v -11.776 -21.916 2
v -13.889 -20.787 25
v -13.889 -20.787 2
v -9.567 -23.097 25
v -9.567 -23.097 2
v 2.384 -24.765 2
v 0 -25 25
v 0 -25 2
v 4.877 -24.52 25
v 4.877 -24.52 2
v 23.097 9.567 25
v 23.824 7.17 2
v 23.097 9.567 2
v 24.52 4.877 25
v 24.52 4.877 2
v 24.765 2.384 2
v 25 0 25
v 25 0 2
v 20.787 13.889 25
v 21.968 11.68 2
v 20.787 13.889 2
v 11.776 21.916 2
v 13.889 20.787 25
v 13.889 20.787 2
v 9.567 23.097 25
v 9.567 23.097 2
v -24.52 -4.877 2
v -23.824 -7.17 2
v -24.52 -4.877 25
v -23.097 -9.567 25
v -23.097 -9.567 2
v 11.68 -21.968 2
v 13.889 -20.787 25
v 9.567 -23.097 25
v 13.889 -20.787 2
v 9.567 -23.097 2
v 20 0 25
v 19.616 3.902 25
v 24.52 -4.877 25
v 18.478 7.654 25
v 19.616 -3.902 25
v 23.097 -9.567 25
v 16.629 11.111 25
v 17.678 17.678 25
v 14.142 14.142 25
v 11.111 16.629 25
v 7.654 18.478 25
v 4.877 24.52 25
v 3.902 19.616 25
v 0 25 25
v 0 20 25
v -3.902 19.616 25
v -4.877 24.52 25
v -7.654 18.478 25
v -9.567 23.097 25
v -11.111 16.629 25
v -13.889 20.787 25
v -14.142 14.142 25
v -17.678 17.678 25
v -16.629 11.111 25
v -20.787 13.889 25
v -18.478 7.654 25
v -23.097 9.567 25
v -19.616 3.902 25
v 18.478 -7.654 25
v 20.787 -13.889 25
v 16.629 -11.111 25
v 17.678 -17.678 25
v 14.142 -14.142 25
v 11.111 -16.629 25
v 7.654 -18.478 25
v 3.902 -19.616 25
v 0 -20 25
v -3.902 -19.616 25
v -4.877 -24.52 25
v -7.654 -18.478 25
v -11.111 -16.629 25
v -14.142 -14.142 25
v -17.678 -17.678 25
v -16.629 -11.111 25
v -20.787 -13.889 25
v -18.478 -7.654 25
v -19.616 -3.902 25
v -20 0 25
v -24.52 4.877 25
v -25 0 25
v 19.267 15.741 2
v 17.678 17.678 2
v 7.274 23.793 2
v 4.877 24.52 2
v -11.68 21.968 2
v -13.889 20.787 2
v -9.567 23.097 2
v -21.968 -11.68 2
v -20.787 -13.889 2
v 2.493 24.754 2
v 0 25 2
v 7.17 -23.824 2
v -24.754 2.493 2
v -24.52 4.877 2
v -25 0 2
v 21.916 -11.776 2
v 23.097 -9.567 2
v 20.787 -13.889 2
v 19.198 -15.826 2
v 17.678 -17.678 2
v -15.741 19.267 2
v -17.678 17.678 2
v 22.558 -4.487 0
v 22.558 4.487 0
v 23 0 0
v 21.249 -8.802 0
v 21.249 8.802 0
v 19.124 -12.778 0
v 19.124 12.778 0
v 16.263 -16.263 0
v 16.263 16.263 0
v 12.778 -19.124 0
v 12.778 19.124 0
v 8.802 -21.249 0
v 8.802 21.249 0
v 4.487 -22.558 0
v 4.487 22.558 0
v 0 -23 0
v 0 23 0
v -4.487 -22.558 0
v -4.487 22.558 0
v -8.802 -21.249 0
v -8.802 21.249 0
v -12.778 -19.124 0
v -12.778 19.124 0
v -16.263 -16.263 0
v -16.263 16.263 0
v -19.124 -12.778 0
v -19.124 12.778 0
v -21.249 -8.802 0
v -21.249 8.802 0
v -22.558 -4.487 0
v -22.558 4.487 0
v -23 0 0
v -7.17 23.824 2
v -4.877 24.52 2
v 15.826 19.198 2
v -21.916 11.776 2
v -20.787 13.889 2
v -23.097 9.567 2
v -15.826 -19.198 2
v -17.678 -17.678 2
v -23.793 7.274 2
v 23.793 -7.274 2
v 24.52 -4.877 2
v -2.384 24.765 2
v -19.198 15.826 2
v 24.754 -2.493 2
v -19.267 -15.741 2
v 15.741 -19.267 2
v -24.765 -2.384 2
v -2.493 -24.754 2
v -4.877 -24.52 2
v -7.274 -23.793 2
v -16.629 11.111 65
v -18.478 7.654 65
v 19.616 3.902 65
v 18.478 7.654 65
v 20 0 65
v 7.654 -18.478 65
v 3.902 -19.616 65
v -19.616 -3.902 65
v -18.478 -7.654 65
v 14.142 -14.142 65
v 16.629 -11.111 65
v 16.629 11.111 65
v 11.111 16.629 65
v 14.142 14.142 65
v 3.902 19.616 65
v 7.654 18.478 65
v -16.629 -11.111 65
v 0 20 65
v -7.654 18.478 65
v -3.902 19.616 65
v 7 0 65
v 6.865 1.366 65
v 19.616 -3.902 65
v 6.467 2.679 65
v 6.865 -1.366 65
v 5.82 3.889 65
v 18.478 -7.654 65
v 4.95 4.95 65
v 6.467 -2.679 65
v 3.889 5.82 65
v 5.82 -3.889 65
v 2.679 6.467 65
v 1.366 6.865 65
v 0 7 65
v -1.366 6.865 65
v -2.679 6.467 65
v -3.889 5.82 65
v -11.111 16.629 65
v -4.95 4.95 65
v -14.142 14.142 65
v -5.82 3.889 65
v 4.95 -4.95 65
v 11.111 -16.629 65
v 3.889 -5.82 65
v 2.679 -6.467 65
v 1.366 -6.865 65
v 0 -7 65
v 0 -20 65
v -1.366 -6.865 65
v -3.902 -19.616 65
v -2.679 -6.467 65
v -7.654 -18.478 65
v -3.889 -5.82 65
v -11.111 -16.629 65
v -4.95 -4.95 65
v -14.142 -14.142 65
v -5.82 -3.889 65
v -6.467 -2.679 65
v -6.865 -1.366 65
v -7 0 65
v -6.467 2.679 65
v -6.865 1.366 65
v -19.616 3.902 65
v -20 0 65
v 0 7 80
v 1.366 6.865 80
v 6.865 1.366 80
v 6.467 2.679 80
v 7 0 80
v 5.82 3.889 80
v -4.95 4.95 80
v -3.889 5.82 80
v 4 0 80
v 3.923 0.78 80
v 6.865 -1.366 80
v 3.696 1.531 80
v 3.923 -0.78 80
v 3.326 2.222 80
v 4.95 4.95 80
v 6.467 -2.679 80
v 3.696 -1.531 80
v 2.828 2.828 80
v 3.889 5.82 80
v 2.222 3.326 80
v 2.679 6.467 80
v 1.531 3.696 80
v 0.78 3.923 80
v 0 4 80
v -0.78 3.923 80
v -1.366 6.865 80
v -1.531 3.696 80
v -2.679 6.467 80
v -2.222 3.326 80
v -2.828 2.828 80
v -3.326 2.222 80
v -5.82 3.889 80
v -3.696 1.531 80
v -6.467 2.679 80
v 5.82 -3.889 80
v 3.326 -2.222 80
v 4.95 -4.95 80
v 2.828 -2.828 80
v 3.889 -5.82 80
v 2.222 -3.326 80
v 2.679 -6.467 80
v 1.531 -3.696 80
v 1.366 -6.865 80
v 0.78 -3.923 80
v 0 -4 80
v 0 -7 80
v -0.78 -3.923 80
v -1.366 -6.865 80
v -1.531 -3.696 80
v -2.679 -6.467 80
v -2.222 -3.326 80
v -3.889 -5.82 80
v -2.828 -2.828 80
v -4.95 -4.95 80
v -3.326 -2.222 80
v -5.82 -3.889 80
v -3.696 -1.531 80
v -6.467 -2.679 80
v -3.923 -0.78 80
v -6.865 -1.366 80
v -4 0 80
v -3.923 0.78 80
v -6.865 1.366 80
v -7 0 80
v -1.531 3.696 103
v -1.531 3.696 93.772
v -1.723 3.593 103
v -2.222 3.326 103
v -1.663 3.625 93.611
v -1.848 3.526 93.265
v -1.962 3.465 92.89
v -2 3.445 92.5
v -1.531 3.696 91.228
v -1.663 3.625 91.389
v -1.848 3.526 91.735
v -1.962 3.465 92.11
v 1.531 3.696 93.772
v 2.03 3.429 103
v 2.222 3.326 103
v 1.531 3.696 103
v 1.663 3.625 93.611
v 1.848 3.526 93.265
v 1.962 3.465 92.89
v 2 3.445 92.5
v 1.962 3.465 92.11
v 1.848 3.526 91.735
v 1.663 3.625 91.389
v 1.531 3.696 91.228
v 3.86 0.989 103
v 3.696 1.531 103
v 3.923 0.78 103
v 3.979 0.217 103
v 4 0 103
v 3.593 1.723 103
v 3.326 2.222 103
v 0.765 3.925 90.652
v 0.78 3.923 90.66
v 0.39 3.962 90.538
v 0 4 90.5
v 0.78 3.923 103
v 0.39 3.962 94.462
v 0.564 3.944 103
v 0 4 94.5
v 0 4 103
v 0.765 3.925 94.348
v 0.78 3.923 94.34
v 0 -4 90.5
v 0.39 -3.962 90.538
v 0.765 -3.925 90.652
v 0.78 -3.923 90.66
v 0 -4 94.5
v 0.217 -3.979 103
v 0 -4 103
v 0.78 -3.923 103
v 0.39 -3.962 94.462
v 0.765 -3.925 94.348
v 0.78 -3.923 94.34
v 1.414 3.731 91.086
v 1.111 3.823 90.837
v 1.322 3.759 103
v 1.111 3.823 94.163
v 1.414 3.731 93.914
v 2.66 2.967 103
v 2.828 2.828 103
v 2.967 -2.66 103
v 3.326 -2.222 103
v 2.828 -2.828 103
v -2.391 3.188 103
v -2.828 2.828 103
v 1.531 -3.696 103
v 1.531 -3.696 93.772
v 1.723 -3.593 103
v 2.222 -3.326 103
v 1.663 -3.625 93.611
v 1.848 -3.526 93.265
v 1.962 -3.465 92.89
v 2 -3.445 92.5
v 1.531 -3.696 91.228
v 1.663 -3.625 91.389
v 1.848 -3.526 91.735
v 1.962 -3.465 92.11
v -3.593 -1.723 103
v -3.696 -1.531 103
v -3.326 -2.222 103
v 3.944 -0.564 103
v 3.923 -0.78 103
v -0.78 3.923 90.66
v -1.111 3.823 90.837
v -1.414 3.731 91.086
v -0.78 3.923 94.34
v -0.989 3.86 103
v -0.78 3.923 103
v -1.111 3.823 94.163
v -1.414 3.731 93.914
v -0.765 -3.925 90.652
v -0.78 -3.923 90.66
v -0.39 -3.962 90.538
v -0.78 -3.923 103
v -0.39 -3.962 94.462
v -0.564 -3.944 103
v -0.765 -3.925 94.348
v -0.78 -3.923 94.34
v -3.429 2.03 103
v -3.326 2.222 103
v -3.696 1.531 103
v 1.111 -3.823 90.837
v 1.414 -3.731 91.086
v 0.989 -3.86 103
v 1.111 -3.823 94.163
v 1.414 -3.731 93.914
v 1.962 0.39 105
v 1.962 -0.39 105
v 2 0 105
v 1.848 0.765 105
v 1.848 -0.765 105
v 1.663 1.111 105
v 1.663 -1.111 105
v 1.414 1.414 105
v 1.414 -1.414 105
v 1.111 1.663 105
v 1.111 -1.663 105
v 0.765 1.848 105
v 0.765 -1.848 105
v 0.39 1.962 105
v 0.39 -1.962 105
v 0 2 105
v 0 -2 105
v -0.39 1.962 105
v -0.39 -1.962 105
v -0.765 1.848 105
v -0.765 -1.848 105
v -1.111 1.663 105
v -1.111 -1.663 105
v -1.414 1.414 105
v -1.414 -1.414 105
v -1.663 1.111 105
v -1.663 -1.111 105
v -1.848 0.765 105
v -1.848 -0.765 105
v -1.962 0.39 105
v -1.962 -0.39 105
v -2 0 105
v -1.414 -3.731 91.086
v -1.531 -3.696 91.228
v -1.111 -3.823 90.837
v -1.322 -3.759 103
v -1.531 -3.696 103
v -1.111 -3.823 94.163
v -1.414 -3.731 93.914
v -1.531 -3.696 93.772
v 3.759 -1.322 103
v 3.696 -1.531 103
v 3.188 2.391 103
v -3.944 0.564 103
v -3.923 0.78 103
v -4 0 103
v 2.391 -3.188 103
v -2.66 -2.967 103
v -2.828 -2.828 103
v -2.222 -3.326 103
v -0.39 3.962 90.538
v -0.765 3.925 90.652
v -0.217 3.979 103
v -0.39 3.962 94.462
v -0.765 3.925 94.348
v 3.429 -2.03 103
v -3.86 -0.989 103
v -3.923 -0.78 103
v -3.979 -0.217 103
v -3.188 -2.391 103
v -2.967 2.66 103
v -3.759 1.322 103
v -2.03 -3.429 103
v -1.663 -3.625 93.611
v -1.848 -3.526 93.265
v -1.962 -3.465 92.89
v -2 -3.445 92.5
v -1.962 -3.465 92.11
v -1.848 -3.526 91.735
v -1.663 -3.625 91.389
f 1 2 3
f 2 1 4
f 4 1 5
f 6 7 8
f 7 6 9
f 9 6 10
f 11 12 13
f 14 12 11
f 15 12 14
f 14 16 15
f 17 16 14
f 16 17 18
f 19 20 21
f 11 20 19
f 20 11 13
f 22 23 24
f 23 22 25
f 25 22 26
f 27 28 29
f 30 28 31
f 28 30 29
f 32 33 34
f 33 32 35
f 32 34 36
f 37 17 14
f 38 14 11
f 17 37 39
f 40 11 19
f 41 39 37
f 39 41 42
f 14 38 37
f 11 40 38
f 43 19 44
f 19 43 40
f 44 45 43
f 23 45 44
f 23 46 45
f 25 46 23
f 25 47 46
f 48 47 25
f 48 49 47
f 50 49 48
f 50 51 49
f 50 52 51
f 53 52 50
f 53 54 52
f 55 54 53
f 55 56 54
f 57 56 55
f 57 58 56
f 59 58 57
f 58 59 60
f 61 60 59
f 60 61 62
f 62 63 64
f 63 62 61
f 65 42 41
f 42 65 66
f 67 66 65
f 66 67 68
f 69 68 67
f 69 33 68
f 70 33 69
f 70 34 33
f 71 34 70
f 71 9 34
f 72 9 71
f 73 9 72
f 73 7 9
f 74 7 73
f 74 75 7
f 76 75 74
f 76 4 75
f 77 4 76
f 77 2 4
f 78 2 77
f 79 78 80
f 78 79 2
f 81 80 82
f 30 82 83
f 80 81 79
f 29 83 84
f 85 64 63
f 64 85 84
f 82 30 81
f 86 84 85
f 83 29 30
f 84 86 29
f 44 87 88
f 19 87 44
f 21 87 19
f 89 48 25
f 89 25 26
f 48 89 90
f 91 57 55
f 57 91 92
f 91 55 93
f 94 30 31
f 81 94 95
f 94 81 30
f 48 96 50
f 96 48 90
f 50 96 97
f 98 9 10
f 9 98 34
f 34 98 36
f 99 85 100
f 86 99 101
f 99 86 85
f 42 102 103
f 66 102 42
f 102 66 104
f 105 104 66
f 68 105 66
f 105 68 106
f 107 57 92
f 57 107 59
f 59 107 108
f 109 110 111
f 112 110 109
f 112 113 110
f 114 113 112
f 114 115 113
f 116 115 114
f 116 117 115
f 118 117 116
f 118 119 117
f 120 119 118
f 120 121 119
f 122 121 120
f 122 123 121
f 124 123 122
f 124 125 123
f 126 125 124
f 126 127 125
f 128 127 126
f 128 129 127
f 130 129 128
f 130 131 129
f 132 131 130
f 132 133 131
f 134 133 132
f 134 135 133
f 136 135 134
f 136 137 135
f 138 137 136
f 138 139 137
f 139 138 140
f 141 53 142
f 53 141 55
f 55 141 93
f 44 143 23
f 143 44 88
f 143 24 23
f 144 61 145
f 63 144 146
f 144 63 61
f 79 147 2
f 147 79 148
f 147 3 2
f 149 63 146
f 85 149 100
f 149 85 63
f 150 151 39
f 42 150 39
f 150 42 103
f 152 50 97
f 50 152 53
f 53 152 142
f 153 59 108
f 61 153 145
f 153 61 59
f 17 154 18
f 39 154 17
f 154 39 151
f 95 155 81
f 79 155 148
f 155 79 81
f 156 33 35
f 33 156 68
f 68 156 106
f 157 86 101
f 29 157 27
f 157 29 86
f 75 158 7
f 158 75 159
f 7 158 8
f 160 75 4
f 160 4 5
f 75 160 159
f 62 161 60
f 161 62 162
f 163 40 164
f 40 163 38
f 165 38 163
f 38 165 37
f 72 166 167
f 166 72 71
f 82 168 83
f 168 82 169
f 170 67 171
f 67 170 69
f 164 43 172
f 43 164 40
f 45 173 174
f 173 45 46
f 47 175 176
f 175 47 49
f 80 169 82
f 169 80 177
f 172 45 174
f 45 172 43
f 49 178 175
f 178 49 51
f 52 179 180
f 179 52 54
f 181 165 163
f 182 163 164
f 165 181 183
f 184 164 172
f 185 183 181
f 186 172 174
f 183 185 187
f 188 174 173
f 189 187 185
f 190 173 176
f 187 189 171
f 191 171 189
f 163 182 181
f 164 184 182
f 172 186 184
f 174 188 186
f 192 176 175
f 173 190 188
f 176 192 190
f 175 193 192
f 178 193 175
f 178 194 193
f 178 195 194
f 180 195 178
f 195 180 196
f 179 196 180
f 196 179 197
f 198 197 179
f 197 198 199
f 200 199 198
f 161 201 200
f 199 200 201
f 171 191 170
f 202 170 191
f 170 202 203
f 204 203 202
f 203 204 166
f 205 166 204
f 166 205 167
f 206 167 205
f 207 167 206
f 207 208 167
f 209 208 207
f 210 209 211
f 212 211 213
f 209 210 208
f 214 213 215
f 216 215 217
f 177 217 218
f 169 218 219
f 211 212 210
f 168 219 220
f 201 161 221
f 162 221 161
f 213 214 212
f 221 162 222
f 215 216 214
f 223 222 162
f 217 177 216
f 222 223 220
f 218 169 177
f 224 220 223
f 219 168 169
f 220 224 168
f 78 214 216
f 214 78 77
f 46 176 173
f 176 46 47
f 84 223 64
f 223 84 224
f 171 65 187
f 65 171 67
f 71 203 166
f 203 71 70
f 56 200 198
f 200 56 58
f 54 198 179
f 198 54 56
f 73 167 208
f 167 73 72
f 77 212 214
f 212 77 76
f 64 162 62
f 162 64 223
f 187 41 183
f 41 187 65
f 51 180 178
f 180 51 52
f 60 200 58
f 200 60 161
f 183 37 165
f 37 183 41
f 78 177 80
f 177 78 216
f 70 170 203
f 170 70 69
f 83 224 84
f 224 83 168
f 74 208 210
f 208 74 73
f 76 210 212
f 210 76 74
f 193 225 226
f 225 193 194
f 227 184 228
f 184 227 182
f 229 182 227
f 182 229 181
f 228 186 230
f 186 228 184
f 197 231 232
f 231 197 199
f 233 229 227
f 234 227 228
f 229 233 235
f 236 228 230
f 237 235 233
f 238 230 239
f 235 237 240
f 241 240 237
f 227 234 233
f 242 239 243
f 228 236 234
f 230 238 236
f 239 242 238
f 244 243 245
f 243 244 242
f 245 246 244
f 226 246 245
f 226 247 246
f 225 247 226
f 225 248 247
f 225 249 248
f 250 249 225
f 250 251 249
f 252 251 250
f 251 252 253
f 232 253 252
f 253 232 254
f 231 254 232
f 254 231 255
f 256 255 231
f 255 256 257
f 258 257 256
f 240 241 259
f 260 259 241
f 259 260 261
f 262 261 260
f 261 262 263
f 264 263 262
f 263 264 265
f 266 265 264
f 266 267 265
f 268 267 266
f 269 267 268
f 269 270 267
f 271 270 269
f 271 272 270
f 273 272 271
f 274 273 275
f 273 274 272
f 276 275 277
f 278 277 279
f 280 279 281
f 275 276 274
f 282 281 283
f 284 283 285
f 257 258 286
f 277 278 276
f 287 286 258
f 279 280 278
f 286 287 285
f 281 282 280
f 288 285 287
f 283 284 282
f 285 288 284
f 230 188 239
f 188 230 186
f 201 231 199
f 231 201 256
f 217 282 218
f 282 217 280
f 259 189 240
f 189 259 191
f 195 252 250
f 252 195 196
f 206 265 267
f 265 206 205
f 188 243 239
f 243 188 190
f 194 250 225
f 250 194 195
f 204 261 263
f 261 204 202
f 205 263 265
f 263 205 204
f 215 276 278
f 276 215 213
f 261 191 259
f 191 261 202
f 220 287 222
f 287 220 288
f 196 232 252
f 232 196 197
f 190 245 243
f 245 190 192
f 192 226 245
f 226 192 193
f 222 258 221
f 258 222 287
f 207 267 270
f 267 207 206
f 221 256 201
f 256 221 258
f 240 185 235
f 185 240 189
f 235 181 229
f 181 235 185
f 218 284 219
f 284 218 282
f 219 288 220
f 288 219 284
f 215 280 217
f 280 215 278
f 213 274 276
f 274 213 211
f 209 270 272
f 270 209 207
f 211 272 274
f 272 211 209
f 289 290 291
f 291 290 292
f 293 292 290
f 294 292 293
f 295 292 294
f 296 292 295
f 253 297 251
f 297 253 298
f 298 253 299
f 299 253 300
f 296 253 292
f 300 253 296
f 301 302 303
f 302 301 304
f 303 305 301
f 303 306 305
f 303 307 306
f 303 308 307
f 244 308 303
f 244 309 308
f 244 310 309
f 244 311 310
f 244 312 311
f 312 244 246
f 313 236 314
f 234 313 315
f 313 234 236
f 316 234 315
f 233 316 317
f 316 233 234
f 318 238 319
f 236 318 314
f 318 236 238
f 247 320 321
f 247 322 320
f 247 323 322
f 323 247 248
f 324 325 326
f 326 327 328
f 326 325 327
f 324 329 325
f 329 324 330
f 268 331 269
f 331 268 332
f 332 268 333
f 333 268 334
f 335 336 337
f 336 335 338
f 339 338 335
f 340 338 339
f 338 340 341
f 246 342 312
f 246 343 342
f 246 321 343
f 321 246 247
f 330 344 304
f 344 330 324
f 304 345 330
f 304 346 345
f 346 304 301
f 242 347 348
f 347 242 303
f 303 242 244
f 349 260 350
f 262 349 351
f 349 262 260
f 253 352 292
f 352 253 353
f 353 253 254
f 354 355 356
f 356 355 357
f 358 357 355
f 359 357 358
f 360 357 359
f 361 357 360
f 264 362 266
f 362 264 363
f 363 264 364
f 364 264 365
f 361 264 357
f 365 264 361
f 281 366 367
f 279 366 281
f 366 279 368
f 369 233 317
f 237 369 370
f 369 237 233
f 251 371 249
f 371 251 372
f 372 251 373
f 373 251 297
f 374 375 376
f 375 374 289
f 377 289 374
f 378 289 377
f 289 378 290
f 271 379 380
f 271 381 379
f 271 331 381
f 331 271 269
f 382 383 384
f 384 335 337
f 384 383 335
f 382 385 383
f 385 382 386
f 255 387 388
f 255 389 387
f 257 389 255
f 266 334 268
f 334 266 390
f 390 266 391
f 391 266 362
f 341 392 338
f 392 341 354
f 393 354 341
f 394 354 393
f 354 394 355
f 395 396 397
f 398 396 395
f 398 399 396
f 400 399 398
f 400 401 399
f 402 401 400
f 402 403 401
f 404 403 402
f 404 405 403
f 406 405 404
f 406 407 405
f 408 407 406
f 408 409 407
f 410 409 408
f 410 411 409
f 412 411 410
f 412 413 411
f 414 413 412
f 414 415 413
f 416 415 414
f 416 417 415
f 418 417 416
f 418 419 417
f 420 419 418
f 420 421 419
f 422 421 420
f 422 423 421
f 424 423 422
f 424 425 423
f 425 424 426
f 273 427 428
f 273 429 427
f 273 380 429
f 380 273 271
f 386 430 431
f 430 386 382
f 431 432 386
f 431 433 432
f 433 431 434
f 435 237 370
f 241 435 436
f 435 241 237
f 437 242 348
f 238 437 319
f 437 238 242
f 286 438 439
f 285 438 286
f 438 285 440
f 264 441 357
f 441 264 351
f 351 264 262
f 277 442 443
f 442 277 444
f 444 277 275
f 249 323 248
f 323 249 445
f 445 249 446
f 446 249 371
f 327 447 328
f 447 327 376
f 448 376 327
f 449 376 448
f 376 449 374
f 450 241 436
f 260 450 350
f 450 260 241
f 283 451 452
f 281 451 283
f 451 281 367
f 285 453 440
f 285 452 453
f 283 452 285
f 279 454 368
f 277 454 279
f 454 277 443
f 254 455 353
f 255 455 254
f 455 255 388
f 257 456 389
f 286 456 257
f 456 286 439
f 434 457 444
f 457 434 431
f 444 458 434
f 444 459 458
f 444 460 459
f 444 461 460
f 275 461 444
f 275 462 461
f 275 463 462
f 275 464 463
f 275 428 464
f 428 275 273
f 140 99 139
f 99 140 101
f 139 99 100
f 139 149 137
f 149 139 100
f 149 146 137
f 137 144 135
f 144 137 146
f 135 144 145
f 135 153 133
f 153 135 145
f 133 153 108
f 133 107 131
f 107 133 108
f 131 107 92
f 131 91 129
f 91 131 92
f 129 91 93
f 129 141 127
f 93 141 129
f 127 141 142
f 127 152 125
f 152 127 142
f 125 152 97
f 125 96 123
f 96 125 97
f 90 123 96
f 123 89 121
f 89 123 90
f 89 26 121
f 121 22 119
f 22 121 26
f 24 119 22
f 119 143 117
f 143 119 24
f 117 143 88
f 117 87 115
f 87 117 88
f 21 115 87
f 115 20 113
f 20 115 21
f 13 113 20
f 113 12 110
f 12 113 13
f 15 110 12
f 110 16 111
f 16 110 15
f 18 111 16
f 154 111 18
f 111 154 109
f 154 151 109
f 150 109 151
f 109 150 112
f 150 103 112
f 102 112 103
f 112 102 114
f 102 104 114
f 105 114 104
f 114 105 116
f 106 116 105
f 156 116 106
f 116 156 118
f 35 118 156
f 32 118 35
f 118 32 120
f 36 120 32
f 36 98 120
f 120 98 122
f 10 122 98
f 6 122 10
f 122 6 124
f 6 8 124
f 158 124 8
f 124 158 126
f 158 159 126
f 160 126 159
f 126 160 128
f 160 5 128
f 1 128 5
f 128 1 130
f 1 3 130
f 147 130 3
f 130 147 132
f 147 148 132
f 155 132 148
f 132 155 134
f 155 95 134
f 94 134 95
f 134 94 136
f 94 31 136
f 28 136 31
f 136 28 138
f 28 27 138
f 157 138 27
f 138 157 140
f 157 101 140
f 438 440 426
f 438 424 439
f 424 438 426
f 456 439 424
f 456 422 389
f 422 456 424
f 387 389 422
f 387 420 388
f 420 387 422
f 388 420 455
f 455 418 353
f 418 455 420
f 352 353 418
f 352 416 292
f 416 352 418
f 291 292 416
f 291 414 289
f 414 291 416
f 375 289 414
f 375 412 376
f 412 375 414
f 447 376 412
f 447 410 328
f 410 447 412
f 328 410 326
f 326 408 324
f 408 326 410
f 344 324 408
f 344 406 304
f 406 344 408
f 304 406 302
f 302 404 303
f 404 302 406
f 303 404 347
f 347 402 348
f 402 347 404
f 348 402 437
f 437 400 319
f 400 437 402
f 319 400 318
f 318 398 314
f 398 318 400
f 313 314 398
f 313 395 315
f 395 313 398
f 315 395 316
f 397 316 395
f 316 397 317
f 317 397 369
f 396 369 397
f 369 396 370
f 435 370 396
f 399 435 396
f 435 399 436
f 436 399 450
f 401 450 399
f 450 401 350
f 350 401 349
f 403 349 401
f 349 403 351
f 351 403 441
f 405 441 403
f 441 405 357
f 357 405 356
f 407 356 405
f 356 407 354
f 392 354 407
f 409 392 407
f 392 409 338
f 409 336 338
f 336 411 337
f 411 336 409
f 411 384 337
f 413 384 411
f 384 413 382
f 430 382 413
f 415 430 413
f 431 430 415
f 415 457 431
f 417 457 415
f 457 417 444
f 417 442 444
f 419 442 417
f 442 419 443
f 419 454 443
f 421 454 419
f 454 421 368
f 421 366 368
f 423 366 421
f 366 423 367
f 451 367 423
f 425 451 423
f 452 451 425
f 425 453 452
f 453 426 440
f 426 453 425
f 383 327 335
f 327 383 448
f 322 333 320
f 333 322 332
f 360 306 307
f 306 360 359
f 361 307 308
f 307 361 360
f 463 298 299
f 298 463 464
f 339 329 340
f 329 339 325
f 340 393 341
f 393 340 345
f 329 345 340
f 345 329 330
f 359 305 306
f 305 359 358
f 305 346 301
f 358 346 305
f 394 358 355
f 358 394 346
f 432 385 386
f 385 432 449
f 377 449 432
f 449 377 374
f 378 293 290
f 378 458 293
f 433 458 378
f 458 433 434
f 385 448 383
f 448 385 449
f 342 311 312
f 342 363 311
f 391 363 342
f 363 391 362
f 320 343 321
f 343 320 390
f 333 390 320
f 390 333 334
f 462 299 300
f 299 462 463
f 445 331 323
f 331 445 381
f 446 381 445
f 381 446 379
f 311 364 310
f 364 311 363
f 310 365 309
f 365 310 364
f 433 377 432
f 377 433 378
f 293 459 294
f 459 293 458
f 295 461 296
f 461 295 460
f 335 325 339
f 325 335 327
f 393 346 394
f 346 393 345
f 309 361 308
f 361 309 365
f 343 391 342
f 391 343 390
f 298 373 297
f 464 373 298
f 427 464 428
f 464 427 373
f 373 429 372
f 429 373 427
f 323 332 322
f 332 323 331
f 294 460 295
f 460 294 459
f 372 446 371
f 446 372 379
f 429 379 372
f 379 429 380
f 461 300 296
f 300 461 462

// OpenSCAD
$fn = 32;

// ----------------------------------------------------------------------
// Stepped shaft: diameters 50, 40, 14, 8 mm, 105 mm long
// ----------------------------------------------------------------------

// --- parameters (mm) ---
d1 = 50;                  // step 1 diameter
len1 = 25;                // step 1 length
d2 = 40;                  // step 2 diameter
len2 = 40;                // step 2 length
d3 = 14;                  // step 3 diameter
len3 = 15;                // step 3 length
d4 = 8;                   // step 4 diameter
len4 = 25;                // step 4 length
total = 105;              // overall length
chamfer = 2;              // end chamfer
cross_d = 4;              // cross pin hole
cross_z = 92.5;           // cross hole position

difference() {
  /* turned body: stacked cylinders, every step sunk into the bigger one */
  union() {
    cylinder(h = len1, d = d1);
    translate([0, 0, 24.6]) cylinder(h = 40.4, d = d2);
    translate([0, 0, 64.6]) cylinder(h = 15.4, d = d3);
    translate([0, 0, 79.6]) cylinder(h = 25.4, d = d4);
  }
  /* bottom chamfer ring cut */
  rotate_extrude() translate([23, -2.5]) polygon([[0, 0], [4.5, 0], [4.5, 7], [0, 2.5]]);
  /* top chamfer ring cut */
  rotate_extrude() translate([2, 105]) polygon([[0, 0], [4.5, -4.5], [4.5, 2.5], [0, 2.5]]);
  /* cross pin hole through the small step */
  translate([0, 0, cross_z]) rotate([90, 0, 0]) cylinder(h = d4 + 5, d = cross_d, center = true);
}
